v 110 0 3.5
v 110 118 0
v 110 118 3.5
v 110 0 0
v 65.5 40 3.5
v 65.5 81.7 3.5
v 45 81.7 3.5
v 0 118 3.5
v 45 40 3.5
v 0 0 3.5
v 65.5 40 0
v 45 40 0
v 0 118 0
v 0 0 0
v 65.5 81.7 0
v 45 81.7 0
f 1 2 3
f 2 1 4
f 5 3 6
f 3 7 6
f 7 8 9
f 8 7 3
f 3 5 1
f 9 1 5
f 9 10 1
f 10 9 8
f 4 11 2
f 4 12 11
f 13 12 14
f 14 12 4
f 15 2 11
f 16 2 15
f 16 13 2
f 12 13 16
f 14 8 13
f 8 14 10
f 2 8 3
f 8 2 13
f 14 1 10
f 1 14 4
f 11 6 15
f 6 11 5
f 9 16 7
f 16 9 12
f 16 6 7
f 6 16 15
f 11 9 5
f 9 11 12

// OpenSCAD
difference(){
cube([110,118,3.5]);
translate([45,40,0])cube([20.5,41.7,3.5]);
}
